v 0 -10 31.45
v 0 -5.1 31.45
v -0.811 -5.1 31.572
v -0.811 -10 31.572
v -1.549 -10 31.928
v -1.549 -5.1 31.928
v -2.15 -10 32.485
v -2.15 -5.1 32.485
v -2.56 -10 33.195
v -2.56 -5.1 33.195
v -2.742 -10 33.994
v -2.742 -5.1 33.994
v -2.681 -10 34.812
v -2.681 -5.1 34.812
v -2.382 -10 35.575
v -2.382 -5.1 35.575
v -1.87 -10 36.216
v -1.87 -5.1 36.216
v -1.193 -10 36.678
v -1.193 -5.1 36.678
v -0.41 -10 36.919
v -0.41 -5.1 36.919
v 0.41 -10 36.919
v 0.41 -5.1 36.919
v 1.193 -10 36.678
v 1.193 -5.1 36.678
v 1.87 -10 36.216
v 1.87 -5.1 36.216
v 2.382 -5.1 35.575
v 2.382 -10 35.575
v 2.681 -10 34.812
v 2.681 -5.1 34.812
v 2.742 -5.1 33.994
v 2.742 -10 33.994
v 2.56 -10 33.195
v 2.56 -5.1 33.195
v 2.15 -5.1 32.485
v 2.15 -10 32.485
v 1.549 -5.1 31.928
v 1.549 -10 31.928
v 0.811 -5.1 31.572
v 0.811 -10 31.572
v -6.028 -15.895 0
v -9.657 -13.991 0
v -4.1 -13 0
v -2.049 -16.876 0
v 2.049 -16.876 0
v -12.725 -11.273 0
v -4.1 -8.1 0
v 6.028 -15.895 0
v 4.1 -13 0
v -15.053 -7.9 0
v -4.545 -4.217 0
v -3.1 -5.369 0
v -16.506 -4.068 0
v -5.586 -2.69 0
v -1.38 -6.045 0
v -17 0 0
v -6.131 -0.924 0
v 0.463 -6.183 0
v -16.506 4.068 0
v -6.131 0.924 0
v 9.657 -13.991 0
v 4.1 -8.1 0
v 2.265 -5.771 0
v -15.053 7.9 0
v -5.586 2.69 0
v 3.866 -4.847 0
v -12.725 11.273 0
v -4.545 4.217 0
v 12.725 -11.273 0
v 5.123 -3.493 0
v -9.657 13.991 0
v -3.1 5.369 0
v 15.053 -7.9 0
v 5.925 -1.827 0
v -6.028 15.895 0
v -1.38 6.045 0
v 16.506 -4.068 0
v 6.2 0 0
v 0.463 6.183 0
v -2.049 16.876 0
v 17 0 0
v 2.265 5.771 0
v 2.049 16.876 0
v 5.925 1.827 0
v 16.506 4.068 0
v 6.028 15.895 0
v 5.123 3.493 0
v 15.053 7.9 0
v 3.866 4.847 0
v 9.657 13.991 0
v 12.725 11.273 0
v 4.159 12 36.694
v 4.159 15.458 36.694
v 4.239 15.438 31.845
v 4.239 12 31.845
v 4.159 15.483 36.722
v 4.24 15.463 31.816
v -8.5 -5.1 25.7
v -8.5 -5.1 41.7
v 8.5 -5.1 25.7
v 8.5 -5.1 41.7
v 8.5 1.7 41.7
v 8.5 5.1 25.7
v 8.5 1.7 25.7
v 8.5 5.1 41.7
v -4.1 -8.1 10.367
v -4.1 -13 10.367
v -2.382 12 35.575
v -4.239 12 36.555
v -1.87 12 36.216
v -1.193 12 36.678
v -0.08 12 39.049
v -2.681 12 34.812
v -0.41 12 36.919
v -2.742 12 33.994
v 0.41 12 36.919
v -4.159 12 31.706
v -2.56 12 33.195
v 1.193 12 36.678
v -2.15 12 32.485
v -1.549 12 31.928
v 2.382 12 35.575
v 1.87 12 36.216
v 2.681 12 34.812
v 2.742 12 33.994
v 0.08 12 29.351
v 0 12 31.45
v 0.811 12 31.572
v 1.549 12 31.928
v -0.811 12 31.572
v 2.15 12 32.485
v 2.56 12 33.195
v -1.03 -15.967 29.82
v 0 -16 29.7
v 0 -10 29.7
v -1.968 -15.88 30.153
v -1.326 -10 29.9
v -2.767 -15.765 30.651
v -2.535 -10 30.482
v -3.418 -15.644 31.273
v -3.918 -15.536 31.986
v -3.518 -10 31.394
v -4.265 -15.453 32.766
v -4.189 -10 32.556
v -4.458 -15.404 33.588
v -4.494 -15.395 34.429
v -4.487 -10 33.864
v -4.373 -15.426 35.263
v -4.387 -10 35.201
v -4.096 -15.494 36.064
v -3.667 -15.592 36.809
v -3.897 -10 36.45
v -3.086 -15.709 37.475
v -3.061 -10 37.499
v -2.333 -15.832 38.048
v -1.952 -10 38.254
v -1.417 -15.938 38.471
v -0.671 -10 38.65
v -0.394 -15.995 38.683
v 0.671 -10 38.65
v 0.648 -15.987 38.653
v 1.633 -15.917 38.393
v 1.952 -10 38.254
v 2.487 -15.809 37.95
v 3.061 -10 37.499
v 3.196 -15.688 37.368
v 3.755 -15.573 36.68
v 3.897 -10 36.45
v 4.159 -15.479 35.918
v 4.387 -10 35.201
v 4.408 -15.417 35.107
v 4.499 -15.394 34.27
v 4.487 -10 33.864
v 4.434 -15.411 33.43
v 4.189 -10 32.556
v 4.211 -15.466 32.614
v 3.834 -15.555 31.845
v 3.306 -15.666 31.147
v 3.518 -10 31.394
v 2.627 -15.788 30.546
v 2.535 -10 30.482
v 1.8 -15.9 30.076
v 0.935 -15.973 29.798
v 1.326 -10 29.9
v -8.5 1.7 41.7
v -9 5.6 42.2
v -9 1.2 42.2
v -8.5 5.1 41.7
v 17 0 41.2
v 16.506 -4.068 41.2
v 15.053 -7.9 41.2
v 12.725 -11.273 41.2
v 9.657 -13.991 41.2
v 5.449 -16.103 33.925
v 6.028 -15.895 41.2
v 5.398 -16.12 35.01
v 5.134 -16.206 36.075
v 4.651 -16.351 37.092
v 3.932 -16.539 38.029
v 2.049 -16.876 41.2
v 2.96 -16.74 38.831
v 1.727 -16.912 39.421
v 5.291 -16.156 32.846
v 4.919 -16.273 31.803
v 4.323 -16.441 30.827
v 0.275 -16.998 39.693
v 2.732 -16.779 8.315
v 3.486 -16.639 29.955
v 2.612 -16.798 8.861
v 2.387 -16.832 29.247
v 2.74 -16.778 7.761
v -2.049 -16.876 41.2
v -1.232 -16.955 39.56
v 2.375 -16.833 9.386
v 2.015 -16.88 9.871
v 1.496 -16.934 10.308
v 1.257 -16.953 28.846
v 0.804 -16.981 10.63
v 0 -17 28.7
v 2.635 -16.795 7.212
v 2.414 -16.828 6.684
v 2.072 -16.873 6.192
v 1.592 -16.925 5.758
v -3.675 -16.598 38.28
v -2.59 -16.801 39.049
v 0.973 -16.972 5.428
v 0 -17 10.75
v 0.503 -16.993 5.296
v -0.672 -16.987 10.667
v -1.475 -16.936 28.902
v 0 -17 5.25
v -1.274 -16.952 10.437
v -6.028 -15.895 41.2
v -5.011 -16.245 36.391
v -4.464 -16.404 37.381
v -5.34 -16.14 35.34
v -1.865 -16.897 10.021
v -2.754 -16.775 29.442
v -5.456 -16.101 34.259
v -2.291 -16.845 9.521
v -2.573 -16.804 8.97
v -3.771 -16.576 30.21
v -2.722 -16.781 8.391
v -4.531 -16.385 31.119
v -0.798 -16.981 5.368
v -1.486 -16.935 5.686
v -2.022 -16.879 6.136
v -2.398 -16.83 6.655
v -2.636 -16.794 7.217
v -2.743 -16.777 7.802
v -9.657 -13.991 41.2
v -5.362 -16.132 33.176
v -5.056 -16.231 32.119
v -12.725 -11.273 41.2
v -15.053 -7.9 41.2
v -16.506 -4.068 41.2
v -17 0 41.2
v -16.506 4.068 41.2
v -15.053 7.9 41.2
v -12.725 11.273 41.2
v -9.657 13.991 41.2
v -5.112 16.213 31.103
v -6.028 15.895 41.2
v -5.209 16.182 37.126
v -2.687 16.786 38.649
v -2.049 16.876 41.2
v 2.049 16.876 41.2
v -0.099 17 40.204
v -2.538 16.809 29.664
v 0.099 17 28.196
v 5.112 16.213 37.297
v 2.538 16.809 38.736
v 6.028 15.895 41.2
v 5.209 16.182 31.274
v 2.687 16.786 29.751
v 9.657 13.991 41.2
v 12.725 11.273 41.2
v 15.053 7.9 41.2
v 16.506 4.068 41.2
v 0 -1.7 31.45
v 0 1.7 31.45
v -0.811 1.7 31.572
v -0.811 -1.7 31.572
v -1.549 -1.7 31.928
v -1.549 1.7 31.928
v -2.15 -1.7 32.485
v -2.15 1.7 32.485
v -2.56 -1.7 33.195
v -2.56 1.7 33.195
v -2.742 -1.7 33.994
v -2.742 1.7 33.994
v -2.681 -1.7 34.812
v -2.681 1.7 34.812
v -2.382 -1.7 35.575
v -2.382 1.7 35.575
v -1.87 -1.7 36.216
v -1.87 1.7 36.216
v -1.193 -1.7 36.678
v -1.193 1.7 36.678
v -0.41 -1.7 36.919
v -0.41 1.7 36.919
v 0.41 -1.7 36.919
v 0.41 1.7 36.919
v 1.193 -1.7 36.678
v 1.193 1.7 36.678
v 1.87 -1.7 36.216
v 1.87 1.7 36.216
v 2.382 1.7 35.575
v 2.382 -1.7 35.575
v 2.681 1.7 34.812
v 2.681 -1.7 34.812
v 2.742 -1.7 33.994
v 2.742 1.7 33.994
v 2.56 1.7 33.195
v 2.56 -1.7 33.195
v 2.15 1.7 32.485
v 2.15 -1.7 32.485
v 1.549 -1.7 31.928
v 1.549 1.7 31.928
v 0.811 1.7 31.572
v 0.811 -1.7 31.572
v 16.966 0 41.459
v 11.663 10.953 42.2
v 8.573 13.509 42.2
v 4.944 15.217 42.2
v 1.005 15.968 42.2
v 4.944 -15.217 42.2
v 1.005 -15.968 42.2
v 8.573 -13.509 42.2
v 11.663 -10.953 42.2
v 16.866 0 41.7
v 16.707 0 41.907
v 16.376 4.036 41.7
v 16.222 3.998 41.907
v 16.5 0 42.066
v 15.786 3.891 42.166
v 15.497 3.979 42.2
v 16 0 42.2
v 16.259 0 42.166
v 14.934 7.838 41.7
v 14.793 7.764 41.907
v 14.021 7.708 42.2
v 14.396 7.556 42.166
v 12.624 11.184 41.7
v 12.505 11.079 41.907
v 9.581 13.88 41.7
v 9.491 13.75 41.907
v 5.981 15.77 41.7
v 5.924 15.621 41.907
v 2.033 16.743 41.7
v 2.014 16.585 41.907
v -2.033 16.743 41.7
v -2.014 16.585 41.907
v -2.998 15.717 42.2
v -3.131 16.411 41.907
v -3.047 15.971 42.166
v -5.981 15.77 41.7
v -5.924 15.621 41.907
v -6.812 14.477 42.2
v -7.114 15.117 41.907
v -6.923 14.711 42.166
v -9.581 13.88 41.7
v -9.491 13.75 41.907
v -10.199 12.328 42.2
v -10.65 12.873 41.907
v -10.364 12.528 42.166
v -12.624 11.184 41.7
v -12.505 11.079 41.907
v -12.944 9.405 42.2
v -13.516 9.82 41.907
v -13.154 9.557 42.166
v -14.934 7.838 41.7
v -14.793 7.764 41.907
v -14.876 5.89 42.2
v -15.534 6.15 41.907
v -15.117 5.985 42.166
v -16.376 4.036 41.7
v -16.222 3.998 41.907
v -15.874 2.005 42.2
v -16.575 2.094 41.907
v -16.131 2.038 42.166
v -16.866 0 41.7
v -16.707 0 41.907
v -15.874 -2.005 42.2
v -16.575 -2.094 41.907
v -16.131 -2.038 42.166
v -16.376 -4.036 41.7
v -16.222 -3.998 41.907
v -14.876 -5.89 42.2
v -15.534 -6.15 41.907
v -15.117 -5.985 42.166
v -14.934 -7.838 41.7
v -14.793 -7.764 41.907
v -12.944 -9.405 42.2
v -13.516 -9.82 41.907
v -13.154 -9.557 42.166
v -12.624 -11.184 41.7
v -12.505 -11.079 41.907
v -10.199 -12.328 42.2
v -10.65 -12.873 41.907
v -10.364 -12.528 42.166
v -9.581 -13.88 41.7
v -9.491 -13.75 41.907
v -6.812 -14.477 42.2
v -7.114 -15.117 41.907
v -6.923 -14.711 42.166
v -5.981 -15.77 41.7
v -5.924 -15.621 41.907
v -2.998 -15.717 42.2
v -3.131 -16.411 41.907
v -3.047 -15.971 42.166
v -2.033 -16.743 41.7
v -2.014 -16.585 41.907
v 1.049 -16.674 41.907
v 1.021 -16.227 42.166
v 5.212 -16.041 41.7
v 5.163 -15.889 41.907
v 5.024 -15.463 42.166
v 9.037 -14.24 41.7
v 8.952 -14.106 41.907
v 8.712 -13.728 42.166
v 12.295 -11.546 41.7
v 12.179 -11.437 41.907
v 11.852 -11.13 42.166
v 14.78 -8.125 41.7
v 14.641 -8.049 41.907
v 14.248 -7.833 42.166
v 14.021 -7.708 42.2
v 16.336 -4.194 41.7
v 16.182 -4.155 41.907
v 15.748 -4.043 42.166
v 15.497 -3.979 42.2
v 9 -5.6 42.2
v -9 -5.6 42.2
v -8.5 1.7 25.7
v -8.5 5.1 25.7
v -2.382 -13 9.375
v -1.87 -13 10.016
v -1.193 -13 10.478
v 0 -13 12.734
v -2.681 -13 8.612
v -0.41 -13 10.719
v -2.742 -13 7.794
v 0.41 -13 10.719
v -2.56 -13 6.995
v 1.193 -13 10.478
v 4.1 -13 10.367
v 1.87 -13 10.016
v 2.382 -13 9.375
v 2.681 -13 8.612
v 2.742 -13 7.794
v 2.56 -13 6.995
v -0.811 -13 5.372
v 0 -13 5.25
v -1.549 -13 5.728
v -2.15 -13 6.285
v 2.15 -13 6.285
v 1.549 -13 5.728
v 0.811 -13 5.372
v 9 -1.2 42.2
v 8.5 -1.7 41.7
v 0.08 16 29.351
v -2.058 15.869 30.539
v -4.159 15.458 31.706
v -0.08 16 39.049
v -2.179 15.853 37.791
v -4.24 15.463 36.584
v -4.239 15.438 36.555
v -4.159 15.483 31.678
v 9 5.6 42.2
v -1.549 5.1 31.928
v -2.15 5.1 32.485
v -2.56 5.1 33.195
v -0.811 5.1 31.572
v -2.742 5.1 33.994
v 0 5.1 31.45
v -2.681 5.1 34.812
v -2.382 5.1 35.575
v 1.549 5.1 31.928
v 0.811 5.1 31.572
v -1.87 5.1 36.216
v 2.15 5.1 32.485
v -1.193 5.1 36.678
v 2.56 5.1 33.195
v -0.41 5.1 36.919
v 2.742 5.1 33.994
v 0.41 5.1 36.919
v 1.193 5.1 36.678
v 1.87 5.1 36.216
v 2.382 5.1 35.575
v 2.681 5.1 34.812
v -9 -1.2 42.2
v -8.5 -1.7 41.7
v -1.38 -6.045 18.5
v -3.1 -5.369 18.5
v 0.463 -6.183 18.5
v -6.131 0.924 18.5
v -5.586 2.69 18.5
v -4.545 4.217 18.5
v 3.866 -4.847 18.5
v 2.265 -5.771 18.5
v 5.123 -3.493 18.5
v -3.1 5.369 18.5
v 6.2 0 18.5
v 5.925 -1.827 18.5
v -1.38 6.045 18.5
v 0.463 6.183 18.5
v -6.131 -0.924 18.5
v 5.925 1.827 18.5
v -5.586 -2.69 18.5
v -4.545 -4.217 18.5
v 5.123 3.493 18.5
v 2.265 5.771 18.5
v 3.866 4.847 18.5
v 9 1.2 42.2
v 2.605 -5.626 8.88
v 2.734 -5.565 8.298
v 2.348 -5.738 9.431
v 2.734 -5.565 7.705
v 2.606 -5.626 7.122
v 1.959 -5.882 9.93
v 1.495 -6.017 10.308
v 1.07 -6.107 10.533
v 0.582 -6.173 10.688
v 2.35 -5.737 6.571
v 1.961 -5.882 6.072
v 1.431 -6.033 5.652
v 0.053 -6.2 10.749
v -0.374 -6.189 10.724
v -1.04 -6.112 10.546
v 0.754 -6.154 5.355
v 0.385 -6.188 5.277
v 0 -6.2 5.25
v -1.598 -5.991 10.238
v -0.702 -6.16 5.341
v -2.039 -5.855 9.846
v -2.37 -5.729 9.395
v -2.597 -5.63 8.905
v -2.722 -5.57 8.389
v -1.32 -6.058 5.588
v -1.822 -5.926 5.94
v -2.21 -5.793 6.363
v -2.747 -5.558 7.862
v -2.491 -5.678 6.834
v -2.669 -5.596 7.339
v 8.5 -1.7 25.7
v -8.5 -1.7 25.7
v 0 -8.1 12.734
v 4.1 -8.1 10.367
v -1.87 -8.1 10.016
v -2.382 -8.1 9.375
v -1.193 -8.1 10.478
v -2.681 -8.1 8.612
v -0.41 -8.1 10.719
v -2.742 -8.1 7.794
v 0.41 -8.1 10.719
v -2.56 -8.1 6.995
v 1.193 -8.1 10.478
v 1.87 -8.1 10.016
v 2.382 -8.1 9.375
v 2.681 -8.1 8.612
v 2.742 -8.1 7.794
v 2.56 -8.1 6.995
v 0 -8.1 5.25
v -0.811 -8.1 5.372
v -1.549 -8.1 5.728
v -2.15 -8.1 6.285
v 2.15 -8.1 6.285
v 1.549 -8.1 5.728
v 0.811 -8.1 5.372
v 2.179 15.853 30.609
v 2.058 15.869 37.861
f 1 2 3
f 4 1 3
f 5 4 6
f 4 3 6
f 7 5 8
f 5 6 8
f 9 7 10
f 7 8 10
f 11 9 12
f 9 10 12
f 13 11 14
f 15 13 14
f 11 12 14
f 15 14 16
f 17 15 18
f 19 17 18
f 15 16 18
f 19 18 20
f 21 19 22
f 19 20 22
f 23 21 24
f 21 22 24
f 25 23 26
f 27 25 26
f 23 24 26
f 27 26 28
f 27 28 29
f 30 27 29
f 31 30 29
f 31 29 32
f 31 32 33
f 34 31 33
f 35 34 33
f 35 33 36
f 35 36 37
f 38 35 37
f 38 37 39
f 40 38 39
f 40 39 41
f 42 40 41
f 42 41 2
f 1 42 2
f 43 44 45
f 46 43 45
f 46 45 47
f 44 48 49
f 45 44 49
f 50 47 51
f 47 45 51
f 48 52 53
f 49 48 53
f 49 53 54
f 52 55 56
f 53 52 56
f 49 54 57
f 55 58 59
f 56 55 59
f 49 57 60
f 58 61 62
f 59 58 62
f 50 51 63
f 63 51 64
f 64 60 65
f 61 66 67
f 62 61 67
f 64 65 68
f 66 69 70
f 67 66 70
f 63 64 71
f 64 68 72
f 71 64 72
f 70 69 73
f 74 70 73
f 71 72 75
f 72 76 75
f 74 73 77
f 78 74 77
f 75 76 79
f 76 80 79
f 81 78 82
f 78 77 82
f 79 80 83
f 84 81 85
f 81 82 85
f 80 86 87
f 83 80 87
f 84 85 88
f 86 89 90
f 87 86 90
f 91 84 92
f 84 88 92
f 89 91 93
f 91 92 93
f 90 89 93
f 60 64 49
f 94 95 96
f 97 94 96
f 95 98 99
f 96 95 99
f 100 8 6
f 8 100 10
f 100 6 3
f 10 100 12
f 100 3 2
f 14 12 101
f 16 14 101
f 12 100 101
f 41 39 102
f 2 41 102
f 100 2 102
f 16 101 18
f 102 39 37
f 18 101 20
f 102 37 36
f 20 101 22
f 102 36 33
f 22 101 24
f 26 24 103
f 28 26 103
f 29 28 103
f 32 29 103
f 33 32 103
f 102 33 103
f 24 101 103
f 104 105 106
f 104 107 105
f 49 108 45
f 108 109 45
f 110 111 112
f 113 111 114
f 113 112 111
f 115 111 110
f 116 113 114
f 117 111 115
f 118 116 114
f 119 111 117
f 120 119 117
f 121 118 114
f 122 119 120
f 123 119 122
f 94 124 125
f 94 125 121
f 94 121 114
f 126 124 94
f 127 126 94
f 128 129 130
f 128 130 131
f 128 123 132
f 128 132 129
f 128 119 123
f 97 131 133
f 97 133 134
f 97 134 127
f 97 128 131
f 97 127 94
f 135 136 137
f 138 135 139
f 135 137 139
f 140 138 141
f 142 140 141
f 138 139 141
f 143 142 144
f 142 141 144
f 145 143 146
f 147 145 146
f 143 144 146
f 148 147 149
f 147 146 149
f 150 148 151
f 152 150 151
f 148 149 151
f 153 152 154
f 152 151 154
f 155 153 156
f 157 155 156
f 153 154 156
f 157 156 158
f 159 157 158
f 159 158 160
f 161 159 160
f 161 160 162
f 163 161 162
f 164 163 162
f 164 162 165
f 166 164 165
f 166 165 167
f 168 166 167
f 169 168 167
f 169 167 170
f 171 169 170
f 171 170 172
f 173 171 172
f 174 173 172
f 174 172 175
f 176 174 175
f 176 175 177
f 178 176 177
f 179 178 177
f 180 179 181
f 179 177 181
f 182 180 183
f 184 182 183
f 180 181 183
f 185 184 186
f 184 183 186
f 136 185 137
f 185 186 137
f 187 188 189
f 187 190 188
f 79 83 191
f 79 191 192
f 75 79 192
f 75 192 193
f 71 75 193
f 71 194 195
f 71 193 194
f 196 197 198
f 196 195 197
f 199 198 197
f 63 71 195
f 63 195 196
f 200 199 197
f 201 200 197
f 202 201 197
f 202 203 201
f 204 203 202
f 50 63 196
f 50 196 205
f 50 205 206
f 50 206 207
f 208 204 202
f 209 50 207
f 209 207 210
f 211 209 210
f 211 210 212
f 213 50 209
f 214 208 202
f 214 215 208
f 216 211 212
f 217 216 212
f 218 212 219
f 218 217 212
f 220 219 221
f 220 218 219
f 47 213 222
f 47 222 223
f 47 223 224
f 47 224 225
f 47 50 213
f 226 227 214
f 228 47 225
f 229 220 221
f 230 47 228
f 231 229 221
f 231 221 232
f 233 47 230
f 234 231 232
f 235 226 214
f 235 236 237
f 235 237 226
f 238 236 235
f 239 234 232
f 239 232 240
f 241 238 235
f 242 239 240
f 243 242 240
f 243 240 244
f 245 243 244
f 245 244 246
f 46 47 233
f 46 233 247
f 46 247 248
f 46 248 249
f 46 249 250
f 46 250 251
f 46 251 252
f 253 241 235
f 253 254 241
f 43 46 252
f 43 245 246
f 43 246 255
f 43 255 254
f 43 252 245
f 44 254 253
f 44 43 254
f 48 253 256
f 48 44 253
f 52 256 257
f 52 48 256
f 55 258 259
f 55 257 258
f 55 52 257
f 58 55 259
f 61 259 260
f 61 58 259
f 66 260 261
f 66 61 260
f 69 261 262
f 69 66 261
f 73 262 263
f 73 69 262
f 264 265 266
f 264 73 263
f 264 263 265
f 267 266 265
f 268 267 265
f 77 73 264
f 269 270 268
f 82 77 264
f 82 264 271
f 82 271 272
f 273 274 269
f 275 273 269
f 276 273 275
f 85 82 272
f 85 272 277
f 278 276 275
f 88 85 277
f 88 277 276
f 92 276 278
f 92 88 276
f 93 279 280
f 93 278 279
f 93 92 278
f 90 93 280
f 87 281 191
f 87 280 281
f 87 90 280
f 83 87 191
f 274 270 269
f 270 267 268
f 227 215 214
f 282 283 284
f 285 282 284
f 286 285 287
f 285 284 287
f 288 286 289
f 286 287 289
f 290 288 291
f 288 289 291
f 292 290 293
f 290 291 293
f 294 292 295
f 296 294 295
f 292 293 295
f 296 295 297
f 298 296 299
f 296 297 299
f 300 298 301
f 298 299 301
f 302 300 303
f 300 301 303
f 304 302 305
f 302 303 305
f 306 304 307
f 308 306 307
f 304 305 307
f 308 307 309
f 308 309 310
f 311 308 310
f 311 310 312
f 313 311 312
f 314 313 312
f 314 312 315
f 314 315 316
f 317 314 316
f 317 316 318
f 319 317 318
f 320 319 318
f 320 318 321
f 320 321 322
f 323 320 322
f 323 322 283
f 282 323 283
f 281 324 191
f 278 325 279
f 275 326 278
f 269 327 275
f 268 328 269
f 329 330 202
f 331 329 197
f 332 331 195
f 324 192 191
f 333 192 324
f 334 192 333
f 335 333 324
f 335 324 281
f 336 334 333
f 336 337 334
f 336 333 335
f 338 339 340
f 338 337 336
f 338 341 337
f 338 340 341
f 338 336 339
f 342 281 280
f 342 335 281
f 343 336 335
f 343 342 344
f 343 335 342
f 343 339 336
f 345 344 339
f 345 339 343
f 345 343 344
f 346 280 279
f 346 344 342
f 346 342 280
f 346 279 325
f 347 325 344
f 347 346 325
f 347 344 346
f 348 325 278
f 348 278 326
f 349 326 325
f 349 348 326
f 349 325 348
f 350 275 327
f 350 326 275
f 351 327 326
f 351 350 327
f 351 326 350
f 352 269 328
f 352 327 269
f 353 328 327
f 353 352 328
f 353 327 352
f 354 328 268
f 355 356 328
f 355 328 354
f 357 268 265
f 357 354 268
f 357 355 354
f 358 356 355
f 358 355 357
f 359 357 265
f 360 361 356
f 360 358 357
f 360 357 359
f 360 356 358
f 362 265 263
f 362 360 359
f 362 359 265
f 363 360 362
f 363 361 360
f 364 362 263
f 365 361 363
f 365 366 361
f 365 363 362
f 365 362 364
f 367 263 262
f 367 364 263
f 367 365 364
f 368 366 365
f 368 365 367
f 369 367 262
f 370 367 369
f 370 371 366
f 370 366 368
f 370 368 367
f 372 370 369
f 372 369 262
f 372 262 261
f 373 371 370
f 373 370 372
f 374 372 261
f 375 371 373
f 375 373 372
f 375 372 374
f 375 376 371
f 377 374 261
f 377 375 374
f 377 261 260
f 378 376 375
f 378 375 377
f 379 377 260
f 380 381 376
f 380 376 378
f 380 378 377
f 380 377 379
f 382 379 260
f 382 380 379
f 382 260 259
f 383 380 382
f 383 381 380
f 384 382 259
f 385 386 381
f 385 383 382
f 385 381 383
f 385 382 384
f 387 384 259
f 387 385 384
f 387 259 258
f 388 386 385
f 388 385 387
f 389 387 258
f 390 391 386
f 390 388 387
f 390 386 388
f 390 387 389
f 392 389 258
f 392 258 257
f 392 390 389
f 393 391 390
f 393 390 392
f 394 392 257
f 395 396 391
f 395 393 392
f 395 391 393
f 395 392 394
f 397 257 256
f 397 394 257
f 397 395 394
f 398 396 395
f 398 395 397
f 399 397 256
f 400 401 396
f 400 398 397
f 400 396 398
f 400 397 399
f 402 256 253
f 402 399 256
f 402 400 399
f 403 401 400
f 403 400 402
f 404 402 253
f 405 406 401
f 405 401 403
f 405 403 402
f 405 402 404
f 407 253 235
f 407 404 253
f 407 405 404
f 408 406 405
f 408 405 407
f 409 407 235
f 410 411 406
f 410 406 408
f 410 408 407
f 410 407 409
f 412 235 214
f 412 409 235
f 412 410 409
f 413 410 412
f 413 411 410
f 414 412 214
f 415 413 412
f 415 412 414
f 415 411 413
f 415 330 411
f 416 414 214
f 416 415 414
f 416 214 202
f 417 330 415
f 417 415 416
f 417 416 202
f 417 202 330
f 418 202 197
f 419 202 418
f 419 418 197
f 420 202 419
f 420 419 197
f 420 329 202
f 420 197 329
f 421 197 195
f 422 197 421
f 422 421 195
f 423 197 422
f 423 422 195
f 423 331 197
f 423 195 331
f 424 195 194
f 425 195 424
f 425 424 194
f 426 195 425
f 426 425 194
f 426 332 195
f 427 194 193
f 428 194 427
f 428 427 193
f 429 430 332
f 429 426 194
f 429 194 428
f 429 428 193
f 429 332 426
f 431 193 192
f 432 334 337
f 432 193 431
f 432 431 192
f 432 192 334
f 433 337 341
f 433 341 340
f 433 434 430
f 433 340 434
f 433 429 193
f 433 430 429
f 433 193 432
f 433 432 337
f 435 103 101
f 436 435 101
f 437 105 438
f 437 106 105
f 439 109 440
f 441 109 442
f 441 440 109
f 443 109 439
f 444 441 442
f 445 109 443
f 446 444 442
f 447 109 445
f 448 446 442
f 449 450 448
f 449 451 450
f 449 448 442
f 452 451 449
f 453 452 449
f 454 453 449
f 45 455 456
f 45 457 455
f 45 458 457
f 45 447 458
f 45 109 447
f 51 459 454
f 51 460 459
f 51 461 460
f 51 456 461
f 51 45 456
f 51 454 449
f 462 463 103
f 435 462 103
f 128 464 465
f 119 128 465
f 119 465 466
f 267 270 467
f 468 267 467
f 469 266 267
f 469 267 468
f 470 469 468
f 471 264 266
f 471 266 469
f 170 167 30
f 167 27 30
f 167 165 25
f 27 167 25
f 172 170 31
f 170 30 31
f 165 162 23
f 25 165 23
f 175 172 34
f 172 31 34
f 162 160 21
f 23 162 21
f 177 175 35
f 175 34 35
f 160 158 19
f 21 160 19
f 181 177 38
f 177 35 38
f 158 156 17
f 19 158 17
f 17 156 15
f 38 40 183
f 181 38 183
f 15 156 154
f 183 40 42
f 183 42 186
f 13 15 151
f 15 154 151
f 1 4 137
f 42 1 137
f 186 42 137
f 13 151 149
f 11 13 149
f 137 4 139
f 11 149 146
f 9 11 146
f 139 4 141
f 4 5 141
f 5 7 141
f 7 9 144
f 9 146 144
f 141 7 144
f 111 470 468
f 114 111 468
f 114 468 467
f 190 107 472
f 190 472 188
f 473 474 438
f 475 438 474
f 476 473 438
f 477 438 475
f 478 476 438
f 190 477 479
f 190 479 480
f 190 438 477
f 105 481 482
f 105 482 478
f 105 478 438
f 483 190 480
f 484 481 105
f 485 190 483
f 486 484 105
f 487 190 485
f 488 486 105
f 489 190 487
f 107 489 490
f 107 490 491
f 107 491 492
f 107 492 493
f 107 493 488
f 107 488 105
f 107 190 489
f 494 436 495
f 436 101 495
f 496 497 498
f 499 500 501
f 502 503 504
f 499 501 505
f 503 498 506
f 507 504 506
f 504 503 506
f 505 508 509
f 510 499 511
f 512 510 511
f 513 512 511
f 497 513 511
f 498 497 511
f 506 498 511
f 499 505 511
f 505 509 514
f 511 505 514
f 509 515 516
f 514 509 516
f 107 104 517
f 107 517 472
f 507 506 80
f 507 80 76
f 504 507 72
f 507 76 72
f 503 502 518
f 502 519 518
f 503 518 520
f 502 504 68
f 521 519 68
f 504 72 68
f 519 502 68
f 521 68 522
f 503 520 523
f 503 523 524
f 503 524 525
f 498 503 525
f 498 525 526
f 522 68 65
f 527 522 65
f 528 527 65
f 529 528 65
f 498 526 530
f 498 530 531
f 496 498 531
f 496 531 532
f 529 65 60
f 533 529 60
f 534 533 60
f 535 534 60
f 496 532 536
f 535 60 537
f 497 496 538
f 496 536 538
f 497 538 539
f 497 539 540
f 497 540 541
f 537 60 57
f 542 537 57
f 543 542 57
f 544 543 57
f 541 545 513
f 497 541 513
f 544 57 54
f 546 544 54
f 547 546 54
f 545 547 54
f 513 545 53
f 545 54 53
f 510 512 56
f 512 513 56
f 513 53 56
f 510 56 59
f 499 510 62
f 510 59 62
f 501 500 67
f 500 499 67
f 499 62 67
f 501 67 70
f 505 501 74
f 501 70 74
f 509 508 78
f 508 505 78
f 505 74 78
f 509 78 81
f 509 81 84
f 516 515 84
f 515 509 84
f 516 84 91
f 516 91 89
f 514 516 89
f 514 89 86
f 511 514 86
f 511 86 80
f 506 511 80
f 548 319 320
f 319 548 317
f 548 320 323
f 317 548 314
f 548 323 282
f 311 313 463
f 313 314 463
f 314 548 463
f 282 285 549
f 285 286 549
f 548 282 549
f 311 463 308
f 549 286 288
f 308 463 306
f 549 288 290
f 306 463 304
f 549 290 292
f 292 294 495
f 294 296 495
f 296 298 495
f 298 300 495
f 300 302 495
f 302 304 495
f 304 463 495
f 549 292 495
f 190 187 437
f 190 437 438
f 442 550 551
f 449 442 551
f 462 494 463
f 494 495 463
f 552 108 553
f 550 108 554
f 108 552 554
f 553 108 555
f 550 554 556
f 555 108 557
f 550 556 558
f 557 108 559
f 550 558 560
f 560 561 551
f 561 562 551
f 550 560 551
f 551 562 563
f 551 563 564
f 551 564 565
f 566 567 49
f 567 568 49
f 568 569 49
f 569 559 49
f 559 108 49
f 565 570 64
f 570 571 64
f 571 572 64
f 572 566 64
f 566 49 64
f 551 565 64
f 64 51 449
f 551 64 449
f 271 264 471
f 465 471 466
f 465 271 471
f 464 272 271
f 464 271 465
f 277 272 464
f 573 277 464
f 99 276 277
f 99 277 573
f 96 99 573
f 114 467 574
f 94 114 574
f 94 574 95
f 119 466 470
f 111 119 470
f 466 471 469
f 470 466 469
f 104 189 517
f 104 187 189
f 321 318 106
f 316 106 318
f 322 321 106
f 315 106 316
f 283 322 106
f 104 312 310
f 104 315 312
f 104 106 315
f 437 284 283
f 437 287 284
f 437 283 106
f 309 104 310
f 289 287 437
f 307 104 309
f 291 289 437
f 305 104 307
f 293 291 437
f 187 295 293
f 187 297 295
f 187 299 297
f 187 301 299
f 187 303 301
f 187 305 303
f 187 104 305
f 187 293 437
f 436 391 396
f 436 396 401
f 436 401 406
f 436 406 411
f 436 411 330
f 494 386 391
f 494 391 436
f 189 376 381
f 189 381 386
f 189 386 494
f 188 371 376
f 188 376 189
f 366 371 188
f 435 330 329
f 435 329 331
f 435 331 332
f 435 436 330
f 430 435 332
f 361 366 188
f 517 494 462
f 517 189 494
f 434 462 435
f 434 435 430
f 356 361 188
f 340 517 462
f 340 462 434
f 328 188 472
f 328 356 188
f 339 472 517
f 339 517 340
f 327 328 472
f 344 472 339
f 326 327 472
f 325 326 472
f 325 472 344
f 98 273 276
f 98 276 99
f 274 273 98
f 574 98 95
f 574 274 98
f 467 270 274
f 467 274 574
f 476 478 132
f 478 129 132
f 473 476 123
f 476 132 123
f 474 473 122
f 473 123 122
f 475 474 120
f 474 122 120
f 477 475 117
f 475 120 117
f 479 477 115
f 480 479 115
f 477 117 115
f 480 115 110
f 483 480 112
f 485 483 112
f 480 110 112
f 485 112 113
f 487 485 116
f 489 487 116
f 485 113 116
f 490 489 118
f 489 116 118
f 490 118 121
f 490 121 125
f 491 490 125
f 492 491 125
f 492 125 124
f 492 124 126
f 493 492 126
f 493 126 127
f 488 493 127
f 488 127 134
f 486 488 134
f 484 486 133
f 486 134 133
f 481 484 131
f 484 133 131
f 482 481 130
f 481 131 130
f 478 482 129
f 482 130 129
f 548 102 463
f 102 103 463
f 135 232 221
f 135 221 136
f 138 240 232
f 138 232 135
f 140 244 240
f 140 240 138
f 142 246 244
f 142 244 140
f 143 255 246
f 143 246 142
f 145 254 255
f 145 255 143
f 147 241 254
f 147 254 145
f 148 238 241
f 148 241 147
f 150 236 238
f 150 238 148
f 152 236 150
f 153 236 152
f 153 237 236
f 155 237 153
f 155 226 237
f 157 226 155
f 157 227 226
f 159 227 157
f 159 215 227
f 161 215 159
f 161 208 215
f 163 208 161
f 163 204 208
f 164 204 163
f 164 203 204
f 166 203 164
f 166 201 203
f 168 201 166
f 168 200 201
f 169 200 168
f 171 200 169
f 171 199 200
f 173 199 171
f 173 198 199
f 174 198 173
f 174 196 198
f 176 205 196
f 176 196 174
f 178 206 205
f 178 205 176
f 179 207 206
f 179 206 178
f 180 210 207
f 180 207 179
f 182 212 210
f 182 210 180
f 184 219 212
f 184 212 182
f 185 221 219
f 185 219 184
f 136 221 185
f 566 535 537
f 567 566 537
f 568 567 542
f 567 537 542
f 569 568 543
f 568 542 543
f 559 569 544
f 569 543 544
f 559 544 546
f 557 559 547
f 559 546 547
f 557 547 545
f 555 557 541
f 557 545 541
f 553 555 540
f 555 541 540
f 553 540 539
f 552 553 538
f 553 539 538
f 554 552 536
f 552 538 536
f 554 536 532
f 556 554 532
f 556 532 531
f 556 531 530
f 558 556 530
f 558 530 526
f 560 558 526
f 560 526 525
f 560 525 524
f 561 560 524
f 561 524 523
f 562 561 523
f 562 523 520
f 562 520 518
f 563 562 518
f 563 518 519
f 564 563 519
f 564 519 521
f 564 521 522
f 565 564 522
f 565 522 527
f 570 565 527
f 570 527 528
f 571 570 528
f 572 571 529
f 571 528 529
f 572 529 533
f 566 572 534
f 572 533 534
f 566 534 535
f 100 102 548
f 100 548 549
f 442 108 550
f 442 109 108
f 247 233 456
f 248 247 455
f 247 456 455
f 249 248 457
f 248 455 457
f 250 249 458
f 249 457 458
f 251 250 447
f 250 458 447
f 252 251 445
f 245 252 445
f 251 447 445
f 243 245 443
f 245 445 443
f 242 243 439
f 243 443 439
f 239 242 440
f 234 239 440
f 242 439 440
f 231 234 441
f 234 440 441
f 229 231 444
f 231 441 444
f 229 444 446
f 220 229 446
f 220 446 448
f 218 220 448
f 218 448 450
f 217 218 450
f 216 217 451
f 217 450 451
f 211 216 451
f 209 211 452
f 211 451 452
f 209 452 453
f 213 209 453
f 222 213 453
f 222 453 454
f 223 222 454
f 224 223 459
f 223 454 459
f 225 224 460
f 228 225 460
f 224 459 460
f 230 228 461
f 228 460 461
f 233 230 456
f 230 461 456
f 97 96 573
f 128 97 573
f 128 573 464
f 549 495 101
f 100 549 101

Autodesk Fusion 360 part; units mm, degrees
sketch "Esquisse1" plane through (0, 0, 0) normal (0, 0, 1) x (1, 0, 0)
  circle A0 centre (0, 0) radius 17
  circle A1 centre (0, 0) radius 6.2
  dimension "d1" = 34
  dimension "d2" = 12.4
extrude "Extrusion1" add sketch "Esquisse1" along normal blind 22.2 contours A0 | A1
extrude "Extrusion2" cut sketch "Esquisse1" along normal blind 18.5 contours A1
hole "Perçage1" at (0, -17, 8) direction (0, 1, 0) diameter 5.5 depth 17 tip angle 180
ref_plane "Plan de construction1" through (0, -13, 0) normal (0, 1, 0) x (0, 0, 1)
sketch "Esquisse2" plane through (0, -13, 0) normal (0, 1, 0) x (1, 0, 0)
  line L0 (-4.1, 0) -> (4.1, 0)
  line L1 (4.1, 0) -> (4.1, -8)
  line L2 (-4.1, -8) -> (-4.1, 0)
  line L3 (-4.1, -10.3671) -> (0, -12.7343)
  line L4 (0, -12.7343) -> (4.1, -10.3671)
  line L5 (-4.1, -10.3671) -> (-4.1, -8)
  line L6 (4.1, -10.3671) -> (4.1, -8)
  point P0 (0, -8)
  dimension "d12" = 8.2
  dimension "d13" = 4.1
  dimension "d14" = 8
extrude "Extrusion3" cut sketch "Esquisse2" along normal blind 4.9
extrude "Extrusion4" add 1 faces at (1.6321, -3.8543, 22.2) along direction (0, 0, 1) blind 20
sketch "Esquisse5" plane through (0, 0, 42.2) normal (0, 0, 1) x (-1, 0, 0)
  circle A0 centre (0, 0) radius 17
  line L0 (8.5, 5.1) -> (-8.5, 5.1)
  line L1 (-8.5, 5.1) -> (-8.5, 1.7)
  line L2 (-8.5, 1.7) -> (8.5, 1.7)
  line L3 (8.5, 1.7) -> (8.5, 5.1)
  line L4 (11.5333, 0) -> (-9, 0) construction
  line L5 (-8.5, -1.7) -> (8.5, -1.7)
  line L6 (8.5, -1.7) -> (8.5, -5.1)
  line L7 (8.5, -5.1) -> (-8.5, -5.1)
  line L8 (-8.5, -5.1) -> (-8.5, -1.7)
  dimension "d20" = 17
  dimension "d21" = 3.4
  dimension "d22" = 8.5
  dimension "d23" = 1.7
extrude "Extrusion5" cut sketch "Esquisse5" against normal blind 16.5 contours L0 L1 L2 L3 | L5 L6 L7 L8
hole "Perçage2" at (0, -17, 34.2) direction (0, 1, 0) diameter 5.5 depth 41 tip angle 180 counterbore diameter 9 counterbore depth 7
sketch "Esquisse6" plane through (0, 0, 0) normal (0, 1, 0) x (1, 0, 0)
ref_plane "Plan de construction2" through (0, 17, 0) normal (0, 1, 0) x (0, 0, 1)
sketch "Esquisse7" plane through (0, 17, 0) normal (0, 1, 0) x (1, 0, 0)
  line L0 (0.2093, -36.942) -> (6.8092, -36.4383) construction
  circle A0 centre (0, -34.2) radius 2.75
  line L1 (0.2093, -36.942) -> (0, -34.2) construction
  line L2 (-4.1594, -31.7062) -> (-4.2394, -36.5552)
  line L3 (-4.2394, -36.5552) -> (-0.08, -39.0491)
  line L4 (-0.08, -39.0491) -> (4.1594, -36.6938)
  line L5 (4.1594, -36.6938) -> (4.2394, -31.8448)
  line L6 (4.2394, -31.8448) -> (0.08, -29.3509)
  line L7 (0.08, -29.3509) -> (-4.1594, -31.7062)
  point P0 (0, -34.2)
  dimension "d33" = 4.2
extrude "Extrusion6" cut sketch "Esquisse7" against normal blind 5
chamfer "Chanfrein1" distance 0.5 angle 45 8 edges at (0, 1.7, 42.2) (8.5, 3.4, 42.2) (0, 5.1, 42.2) (-8.5, 3.4, 42.2) (0, -1.7, 42.2) (-8.5, -3.4, 42.2) (0, -5.1, 42.2) (8.5, -3.4, 42.2)
chamfer "Chanfrein2" distance 1 angle 45 2 edges at (4.5, -16.3936, 34.2) (-4.5, -16.3936, 34.2)
chamfer "Chanfrein3" distance 1 angle 45 6 edges at (2.1763, 16.8601, 30.6078) (4.1994, 16.4732, 34.2685) (2.056, 16.8752, 37.8624) (-2.1763, 16.8601, 37.7922) (-4.1994, 16.4732, 34.1315) (-2.056, 16.8752, 30.5376)
fillet "Congé1" radius 1 1 edges at (-15.8496, -6.1475, 42.2)
equation "d13 = d12 / 2"
equation "d22 = d20 / 2"
equation "d23 = ( 3.4 / 2 ) * 1 mm"
